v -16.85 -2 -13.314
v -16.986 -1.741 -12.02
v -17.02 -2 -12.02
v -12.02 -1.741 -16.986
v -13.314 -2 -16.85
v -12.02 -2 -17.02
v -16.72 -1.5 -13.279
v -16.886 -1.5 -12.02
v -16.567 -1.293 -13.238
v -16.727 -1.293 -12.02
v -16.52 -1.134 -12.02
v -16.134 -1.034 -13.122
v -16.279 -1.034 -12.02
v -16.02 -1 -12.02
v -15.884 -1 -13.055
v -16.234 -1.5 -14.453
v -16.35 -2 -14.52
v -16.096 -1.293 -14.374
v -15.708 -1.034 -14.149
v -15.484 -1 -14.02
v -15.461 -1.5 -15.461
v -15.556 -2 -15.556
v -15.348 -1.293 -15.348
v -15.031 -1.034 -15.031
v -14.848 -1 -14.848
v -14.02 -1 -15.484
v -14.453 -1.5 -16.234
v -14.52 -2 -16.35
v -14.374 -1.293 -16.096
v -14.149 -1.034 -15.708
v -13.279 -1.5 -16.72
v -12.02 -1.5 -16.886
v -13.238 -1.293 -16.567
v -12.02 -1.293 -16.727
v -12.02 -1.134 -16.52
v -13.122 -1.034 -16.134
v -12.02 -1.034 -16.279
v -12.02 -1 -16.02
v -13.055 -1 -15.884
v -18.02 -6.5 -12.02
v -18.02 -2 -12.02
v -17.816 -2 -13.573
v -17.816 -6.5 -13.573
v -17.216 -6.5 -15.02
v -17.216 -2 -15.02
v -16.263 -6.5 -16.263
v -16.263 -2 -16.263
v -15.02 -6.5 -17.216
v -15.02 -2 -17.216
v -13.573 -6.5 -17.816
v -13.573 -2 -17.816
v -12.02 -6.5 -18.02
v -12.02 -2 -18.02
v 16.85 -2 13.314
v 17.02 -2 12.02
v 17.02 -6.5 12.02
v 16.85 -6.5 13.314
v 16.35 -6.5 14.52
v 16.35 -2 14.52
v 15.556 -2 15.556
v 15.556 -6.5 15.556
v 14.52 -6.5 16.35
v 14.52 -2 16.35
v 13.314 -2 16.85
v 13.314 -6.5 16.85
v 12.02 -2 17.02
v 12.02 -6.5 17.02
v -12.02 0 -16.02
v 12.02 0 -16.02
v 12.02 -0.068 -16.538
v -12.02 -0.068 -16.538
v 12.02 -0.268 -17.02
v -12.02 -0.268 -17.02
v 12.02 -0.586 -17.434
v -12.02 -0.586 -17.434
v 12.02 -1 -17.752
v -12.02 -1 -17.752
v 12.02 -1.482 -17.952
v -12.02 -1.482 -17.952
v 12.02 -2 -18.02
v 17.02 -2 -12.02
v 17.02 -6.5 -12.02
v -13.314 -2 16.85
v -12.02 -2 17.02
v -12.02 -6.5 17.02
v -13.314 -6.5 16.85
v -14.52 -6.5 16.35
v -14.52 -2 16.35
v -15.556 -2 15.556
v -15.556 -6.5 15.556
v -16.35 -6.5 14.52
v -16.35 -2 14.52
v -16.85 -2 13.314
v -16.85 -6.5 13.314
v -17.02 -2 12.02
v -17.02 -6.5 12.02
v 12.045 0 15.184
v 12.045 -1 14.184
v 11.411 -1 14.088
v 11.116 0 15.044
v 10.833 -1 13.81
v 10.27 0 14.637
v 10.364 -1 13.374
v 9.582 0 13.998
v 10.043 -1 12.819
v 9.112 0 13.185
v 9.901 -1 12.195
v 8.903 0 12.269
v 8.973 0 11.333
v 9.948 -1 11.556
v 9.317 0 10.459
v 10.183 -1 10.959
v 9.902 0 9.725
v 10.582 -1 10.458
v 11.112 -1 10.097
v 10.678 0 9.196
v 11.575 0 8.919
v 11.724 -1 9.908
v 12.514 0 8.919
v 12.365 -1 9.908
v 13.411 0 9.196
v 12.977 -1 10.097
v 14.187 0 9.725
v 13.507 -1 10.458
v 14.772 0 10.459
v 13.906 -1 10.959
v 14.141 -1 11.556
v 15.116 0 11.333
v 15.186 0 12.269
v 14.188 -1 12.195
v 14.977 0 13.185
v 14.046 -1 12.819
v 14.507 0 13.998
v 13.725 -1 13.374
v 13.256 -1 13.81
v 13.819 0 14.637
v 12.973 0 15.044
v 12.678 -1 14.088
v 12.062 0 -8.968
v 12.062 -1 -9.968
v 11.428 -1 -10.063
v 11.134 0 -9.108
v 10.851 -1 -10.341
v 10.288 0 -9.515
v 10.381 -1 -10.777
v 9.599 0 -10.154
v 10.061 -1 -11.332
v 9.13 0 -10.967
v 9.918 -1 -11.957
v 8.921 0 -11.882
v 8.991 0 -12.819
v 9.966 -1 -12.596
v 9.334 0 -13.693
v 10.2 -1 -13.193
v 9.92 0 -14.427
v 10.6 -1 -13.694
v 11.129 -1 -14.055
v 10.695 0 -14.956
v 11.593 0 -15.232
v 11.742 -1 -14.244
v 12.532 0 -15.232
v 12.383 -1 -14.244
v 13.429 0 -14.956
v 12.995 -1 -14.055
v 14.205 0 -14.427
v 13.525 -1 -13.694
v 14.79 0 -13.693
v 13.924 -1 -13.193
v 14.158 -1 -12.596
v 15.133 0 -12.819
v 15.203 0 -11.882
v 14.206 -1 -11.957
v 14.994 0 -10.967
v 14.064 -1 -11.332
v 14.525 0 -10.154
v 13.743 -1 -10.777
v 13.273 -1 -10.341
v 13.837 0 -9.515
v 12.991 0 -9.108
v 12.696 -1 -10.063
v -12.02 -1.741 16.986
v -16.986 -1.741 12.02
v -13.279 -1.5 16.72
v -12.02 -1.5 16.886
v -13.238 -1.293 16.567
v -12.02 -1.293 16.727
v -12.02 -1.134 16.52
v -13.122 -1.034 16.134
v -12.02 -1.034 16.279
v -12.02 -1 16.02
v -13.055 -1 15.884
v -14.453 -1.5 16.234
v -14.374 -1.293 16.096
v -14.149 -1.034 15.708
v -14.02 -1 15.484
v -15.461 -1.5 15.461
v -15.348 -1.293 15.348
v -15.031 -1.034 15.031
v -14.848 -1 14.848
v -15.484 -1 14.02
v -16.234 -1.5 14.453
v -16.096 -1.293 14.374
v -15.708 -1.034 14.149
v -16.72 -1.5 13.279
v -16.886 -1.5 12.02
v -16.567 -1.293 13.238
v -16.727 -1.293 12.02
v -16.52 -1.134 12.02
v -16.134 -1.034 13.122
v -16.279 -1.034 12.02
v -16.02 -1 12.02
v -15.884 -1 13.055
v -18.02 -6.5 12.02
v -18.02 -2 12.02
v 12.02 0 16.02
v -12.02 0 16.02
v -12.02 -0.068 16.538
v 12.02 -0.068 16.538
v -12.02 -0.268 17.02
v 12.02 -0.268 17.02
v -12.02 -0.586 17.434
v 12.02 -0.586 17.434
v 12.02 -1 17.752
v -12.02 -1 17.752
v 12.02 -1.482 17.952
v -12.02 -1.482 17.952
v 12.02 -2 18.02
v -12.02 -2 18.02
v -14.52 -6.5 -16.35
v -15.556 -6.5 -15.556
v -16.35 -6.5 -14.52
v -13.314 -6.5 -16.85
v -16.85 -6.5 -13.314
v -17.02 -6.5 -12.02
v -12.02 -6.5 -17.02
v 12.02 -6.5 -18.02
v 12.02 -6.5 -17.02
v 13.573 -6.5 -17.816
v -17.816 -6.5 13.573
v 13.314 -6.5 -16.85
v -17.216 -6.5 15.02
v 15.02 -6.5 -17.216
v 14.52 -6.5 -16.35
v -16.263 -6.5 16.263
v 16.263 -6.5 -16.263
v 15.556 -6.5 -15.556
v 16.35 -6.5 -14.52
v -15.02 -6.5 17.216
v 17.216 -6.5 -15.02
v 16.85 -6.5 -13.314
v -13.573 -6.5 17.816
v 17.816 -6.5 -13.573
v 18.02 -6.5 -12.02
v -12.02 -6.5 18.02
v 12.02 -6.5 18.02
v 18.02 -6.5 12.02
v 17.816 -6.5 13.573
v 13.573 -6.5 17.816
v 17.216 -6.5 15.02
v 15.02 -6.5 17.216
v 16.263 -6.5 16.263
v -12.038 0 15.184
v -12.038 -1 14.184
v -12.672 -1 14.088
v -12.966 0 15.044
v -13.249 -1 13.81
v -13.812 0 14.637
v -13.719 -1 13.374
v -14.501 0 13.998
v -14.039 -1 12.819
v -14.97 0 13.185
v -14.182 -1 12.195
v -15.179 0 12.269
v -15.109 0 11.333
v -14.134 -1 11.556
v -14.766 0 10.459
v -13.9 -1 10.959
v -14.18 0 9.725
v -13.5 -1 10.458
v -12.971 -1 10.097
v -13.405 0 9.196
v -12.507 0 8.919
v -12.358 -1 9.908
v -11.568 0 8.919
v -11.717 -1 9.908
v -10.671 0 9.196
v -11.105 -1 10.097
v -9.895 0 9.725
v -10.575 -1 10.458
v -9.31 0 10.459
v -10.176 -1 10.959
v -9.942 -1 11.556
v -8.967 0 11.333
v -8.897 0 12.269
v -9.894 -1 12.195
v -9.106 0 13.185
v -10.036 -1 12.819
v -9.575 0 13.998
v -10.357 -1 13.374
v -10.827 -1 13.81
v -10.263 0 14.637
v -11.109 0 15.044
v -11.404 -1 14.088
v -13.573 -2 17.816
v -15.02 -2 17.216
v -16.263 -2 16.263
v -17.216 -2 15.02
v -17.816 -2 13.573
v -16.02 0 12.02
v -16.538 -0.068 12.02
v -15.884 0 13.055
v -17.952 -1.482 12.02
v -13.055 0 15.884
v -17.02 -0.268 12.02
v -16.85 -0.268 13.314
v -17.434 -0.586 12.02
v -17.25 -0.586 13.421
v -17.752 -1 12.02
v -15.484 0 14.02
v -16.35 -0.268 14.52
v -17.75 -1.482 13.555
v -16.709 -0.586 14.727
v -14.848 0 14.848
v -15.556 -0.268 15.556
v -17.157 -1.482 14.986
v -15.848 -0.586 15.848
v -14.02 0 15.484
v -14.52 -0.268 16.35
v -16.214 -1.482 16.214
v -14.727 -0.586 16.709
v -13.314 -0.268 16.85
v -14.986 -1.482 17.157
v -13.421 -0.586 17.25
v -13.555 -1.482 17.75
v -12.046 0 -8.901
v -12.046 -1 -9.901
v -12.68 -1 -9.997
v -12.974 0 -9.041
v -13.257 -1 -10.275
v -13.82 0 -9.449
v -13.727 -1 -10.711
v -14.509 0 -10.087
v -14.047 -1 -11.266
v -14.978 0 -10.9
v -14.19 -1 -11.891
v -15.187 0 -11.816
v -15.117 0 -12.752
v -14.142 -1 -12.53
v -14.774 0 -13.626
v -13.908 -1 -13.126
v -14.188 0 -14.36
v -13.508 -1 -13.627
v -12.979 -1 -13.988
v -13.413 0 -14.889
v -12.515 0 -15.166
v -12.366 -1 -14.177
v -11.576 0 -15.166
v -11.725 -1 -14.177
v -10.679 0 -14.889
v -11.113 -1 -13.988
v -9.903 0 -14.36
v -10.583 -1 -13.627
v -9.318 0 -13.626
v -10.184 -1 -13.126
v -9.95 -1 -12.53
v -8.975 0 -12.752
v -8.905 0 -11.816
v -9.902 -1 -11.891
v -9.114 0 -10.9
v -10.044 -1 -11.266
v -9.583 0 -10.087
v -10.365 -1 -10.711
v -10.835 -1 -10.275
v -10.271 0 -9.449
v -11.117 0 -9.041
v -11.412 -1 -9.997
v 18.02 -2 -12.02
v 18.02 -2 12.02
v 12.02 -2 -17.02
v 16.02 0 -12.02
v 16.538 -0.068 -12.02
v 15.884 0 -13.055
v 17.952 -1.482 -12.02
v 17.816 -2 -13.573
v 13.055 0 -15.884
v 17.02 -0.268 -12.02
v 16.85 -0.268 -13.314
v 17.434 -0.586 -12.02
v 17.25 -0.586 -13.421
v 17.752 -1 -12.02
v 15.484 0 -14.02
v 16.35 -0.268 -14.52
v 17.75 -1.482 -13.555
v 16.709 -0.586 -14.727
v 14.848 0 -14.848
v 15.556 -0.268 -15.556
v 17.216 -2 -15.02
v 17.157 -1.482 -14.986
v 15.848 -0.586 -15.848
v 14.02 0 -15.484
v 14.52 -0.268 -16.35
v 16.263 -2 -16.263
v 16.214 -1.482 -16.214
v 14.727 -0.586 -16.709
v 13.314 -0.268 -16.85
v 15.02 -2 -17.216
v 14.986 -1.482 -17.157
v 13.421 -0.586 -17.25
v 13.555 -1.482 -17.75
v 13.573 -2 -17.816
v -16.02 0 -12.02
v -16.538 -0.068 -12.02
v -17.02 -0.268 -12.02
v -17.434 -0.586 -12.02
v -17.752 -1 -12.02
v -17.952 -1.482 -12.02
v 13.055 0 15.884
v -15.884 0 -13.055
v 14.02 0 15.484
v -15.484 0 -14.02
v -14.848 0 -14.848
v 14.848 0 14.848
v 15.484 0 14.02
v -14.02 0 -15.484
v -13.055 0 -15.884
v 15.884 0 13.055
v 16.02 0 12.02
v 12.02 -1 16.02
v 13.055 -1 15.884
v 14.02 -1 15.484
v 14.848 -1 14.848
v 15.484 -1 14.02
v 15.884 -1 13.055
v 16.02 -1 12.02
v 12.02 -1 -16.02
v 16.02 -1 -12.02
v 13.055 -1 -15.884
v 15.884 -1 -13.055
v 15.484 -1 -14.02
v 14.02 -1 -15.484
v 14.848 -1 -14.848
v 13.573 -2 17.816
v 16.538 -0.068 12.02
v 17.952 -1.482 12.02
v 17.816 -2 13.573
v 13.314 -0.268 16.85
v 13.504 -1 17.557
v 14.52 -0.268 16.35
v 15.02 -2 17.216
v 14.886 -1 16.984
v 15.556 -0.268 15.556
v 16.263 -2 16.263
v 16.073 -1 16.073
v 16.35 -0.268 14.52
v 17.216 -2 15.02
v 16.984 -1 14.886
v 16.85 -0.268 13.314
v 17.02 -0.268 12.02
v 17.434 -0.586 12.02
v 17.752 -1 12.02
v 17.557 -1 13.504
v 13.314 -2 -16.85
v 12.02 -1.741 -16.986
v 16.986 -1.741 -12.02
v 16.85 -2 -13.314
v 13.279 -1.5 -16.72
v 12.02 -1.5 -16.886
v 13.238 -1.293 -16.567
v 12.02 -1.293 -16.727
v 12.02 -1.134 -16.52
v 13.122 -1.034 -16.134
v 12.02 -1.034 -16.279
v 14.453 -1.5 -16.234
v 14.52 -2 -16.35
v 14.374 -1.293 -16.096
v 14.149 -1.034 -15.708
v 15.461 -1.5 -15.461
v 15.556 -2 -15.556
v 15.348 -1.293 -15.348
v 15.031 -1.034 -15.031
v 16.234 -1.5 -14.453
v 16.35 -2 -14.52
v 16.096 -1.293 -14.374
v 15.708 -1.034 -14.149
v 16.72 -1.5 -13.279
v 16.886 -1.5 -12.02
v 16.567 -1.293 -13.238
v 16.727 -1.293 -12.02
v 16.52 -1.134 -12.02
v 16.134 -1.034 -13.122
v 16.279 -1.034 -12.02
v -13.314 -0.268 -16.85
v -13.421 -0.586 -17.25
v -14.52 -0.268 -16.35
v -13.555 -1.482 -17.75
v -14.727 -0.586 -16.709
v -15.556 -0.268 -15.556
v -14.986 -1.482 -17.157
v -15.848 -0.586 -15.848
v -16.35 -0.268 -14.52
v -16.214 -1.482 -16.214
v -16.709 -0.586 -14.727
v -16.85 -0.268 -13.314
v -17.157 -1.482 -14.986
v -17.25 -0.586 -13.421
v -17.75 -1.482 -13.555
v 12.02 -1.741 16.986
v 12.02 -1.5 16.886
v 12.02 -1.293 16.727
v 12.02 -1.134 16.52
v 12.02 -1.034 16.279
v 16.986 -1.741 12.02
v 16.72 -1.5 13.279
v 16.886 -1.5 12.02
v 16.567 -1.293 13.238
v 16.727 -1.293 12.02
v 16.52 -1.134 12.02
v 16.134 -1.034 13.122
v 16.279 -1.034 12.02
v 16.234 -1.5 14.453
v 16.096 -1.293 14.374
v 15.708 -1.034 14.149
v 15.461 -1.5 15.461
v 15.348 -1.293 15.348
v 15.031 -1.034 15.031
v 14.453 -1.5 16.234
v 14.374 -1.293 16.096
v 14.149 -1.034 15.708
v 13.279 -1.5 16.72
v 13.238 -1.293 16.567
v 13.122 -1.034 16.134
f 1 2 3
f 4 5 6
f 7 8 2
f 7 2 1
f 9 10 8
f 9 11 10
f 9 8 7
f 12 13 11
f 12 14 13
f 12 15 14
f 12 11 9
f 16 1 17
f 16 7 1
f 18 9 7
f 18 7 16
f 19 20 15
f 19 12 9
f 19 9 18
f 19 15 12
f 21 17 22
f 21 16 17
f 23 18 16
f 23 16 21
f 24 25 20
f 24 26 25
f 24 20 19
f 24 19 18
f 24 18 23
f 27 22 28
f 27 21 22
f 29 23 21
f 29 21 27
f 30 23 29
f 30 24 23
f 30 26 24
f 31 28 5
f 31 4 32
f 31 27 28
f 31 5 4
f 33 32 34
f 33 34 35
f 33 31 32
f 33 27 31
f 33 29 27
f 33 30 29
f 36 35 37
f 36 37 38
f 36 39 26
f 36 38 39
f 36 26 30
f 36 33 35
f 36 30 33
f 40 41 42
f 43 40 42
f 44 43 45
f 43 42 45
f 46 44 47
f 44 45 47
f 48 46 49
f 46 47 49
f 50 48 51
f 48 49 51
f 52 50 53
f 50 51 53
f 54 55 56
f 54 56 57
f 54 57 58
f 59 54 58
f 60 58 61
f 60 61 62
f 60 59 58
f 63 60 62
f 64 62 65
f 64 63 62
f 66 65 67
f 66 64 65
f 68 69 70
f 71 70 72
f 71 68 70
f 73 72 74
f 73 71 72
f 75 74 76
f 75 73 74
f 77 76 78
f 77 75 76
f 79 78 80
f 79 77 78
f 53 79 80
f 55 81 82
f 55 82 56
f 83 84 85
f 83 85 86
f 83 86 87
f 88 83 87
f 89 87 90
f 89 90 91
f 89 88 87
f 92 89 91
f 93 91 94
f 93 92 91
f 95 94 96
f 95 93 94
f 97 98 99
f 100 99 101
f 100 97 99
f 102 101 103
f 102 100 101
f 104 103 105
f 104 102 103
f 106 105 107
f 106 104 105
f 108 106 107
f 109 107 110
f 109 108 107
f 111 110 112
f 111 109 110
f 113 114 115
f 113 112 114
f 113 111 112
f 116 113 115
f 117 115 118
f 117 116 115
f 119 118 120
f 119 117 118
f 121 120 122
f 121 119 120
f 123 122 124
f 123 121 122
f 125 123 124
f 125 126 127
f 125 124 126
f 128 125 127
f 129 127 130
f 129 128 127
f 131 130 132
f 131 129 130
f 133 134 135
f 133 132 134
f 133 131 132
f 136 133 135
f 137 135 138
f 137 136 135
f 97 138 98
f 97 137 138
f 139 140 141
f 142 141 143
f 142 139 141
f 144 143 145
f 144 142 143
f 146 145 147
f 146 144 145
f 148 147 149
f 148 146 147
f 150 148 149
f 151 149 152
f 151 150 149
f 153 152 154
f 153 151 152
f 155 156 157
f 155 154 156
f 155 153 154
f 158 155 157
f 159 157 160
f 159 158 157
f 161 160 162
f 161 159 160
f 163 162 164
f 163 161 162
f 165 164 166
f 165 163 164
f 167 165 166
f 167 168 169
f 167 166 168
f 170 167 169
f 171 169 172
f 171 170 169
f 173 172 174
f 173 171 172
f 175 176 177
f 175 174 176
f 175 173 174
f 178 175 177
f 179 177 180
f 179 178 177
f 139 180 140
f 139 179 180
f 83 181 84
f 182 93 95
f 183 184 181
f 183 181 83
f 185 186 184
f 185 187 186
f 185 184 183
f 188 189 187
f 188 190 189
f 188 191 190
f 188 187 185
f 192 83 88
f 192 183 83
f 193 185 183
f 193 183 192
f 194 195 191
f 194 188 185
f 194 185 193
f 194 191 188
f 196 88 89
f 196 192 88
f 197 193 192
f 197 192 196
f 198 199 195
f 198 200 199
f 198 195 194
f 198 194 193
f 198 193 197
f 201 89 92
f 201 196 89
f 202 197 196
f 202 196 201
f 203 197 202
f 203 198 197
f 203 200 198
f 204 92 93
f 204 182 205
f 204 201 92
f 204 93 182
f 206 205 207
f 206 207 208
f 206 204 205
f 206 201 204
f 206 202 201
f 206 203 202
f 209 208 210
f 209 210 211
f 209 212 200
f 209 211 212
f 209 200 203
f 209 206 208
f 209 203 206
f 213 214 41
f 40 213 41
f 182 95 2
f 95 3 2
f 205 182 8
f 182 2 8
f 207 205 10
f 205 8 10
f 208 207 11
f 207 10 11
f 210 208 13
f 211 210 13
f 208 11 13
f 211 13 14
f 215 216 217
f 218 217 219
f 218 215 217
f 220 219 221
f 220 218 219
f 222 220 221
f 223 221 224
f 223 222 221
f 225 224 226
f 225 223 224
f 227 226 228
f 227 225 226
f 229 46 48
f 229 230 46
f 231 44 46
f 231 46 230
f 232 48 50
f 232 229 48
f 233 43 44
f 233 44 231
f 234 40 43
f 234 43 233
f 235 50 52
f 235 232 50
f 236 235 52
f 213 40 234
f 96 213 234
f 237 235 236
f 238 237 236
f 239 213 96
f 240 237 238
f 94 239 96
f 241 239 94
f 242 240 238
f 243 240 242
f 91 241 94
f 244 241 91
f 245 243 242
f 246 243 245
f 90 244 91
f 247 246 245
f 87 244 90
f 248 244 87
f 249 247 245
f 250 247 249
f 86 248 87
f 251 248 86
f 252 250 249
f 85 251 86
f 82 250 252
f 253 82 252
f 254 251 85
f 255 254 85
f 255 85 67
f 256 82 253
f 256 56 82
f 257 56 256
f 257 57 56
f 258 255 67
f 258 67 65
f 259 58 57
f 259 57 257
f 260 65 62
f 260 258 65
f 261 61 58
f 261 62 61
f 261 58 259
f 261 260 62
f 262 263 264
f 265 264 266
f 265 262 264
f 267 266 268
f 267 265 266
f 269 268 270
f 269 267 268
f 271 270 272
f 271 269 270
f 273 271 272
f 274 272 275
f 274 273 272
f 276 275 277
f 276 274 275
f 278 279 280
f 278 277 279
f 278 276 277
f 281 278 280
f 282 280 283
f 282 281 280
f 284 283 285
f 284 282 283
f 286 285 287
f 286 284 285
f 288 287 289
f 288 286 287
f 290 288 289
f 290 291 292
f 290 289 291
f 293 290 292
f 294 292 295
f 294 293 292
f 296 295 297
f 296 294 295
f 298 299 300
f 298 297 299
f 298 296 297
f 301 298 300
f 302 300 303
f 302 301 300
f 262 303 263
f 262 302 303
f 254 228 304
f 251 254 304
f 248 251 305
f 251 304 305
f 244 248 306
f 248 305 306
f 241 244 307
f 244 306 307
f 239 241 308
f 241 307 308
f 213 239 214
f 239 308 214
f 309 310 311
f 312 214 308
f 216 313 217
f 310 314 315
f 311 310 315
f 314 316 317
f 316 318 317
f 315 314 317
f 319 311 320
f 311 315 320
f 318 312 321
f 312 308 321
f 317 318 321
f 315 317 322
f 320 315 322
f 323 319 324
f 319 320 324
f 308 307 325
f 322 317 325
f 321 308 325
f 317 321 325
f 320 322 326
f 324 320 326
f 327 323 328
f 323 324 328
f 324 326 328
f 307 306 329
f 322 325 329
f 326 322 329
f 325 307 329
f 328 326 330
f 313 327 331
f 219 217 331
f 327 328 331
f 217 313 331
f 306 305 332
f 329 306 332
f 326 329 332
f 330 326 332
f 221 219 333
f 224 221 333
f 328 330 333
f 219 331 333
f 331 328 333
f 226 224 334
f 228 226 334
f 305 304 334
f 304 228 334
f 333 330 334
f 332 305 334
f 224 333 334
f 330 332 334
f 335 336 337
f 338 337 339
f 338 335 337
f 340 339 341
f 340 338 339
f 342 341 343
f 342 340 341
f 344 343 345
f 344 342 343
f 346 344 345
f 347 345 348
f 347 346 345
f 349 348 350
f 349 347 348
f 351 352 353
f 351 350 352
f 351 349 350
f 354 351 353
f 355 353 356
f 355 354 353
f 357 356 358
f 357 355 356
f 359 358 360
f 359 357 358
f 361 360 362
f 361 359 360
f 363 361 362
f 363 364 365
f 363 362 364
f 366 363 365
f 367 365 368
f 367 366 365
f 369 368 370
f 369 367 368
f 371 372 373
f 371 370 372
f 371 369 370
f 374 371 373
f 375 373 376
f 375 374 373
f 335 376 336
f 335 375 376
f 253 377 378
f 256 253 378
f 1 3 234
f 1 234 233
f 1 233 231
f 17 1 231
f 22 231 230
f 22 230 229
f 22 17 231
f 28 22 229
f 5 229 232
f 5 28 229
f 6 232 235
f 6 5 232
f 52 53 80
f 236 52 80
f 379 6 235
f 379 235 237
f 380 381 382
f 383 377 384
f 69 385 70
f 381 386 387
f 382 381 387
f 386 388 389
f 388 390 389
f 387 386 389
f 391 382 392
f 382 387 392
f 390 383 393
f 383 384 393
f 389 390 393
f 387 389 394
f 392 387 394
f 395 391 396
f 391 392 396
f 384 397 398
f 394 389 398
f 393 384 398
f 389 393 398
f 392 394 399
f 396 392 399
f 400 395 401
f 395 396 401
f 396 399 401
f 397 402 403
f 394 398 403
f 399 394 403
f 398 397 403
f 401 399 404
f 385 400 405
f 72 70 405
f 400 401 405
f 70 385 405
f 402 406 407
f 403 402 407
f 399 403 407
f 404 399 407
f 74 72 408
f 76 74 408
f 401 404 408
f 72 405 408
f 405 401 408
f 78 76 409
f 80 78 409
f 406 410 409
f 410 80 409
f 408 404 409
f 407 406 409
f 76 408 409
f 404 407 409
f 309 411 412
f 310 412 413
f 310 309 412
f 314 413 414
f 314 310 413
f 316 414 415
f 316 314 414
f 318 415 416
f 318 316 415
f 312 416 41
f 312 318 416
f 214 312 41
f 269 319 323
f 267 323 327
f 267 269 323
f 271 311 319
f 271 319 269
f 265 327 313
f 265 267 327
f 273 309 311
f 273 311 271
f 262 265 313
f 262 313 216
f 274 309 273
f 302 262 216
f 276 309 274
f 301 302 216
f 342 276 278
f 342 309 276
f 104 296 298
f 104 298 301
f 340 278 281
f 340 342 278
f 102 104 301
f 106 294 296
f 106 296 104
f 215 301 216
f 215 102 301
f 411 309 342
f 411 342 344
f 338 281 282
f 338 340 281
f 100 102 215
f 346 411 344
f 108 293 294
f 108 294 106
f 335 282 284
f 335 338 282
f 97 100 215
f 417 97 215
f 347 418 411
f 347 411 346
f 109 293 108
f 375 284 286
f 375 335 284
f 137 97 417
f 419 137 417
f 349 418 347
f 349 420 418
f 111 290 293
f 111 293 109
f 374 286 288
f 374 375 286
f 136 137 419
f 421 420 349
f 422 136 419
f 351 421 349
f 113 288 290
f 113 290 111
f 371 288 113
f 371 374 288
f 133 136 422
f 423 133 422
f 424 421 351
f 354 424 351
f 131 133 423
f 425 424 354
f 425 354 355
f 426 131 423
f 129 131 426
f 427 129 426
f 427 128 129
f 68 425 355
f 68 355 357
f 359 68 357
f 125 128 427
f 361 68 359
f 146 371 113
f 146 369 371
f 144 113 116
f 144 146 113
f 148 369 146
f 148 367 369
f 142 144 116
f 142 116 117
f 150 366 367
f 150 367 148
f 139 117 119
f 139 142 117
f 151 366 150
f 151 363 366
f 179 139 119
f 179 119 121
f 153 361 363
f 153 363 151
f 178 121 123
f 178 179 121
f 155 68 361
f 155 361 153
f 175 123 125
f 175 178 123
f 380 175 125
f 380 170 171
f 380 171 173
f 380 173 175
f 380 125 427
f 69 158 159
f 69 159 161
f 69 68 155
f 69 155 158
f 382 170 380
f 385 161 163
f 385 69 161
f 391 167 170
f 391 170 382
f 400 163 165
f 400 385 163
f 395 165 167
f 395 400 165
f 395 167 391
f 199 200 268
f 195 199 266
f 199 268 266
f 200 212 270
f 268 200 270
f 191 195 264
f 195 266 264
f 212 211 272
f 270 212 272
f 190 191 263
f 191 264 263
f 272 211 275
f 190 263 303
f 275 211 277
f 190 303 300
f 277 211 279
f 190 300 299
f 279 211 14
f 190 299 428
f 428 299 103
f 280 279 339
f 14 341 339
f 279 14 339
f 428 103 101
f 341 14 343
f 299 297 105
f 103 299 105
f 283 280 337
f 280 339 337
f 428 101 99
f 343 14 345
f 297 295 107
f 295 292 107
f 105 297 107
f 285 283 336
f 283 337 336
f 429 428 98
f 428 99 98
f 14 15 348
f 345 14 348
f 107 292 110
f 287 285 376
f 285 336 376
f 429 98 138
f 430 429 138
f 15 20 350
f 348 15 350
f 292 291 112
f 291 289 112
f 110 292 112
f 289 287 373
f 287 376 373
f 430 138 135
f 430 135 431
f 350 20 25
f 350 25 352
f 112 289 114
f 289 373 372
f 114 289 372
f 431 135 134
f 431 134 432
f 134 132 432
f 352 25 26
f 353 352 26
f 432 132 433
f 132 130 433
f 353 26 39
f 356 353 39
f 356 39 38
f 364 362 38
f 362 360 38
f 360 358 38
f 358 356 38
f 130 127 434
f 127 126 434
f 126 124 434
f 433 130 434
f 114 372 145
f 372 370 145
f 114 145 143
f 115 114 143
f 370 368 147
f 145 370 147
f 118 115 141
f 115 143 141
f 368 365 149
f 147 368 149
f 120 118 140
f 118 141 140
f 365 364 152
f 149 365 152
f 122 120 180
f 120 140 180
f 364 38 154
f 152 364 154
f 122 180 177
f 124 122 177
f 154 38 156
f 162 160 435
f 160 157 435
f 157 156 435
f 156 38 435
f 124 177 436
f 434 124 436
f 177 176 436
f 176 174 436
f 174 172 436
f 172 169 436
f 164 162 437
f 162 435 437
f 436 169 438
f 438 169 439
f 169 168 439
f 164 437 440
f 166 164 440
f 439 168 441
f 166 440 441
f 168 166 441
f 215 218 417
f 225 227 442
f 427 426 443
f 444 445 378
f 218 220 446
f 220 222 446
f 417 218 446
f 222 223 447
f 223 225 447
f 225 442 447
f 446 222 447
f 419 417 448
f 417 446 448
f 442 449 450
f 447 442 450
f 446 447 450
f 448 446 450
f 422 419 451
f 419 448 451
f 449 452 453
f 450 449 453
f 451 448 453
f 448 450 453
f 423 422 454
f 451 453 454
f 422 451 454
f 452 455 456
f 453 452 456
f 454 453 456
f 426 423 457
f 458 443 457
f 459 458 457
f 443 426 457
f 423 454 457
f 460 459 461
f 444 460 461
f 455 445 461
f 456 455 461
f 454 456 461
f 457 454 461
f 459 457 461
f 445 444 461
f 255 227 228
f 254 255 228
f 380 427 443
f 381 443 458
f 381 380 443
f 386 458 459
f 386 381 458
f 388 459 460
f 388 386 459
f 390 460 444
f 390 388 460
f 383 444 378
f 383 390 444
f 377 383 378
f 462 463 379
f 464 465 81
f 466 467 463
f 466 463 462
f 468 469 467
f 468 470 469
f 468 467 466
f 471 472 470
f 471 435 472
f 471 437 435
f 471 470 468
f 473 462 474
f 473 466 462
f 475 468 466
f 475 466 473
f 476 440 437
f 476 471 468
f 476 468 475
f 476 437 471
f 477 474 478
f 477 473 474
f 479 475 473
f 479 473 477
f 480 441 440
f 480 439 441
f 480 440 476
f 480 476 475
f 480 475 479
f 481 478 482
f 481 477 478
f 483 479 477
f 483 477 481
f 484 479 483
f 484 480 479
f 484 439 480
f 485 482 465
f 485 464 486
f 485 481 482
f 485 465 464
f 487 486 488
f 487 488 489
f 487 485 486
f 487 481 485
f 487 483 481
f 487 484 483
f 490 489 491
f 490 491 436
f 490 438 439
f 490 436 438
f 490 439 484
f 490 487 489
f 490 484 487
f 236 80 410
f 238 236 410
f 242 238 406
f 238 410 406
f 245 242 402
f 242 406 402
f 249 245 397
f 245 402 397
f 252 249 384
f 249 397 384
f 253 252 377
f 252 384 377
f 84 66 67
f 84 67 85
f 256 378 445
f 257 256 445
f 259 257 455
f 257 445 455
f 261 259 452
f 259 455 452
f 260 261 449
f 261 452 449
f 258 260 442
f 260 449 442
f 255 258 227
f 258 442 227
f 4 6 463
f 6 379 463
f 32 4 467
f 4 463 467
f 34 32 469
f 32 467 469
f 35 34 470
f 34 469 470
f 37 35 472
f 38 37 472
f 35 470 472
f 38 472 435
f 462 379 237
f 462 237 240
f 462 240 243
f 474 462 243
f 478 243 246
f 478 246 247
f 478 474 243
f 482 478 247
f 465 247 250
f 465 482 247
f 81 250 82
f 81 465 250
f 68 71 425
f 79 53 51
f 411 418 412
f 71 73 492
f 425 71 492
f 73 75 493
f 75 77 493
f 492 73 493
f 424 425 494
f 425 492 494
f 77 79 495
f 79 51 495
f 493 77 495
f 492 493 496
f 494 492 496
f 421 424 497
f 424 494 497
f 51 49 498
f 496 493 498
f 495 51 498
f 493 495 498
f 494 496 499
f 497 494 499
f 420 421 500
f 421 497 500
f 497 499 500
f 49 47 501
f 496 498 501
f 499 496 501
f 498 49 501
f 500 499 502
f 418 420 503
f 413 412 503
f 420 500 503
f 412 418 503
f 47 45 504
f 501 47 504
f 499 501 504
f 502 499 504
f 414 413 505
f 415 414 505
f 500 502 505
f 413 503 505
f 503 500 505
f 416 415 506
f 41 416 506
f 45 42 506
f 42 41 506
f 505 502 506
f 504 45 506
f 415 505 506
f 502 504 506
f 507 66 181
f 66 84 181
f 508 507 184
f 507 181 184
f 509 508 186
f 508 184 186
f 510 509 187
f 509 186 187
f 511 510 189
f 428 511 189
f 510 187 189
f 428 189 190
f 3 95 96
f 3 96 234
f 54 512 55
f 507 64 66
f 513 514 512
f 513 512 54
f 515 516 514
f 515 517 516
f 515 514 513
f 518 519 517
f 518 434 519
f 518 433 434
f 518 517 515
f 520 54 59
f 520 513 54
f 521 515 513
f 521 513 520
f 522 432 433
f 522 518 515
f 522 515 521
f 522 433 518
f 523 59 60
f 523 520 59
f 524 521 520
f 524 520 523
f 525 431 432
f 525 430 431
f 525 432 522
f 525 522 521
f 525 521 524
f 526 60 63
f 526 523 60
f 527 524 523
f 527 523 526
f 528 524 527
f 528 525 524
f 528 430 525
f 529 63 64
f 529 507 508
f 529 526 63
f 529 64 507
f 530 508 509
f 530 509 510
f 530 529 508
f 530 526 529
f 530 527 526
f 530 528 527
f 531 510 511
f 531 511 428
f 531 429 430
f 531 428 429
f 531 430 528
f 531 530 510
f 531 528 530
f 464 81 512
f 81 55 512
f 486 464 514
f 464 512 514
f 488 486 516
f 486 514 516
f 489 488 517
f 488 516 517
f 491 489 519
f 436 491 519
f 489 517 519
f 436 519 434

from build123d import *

# Parameters (mm, degrees)
BOSS_EXTRUDE1_DEPTH                          = 1
CSK_FOR_M3_COUNTERSUNK_FLAT_HEAD_SCR_2_COUNT = 2
CSK_FOR_M3_COUNTERSUNK_FLAT_HEAD_SCR_2_PITCH = 34.11906313
CSK_FOR_M3_COUNTERSUNK_FLAT_HEAD_SCR_3_COUNT = 2
CSK_FOR_M3_COUNTERSUNK_FLAT_HEAD_SCR_3_PITCH = 24.08237255
CSK_FOR_M3_COUNTERSUNK_FLAT_HEAD_SCR_4_COUNT = 2
CSK_FOR_M3_COUNTERSUNK_FLAT_HEAD_SCR_4_PITCH = 24.085156004
BOSS_EXTRUDE3_DEPTH                          = 5.5
FILLET1_R                                    = 2
FILLET2_R                                    = 1


with BuildPart() as part:
    # Sketch5 → Boss-Extrude1 (new body)
    with BuildSketch(Plane(origin=(0, 0, 0), x_dir=(1, 0, 0), z_dir=(0, 1, 0))):
        with BuildLine():
            Line((-18.02, 12.02), (-18.02, -12.02))
            ThreePointArc((-18.02, -12.02), (-16.262640687, -16.262640687), (-12.02, -18.02))
            Line((-12.02, -18.02), (12.02, -18.02))
            ThreePointArc((12.02, -18.02), (16.262640687, -16.262640687), (18.02, -12.02))
            Line((18.02, -12.02), (18.02, 12.02))
            ThreePointArc((18.02, 12.02), (16.262640687, 16.262640687), (12.02, 18.02))
            Line((12.02, 18.02), (-12.02, 18.02))
            ThreePointArc((-12.02, 18.02), (-16.262640687, 16.262640687), (-18.02, 12.02))
        make_face()
    extrude(amount=-BOSS_EXTRUDE1_DEPTH)

    # Sketch15 → CSK for M3 Countersunk Flat Head Screw3 (revolve, cut)
    with BuildSketch(Plane(origin=(-12.037863248, 0, 12.033949607), x_dir=(0, 0, 1), z_dir=(1, 0, 0))):
        Polygon((0, 0), (0, 1.001), (1.7, 1.001), (1.7, 1.45), (3.15, 0), align=None)
    csk_for_m3_countersunk_flat_head_screw3 = revolve(axis=Axis((-12.037863248, 6.35, 12.033949607), (0, -1, 0)), mode=Mode.SUBTRACT)

    # CSK for M3 Countersunk Flat Head Scr 2: CSK for M3 Countersunk Flat Head Screw3 ×2
    with Locations(*[Vector(0.706351229, 0, -0.707861527) * (i * CSK_FOR_M3_COUNTERSUNK_FLAT_HEAD_SCR_2_PITCH) for i in range(1, CSK_FOR_M3_COUNTERSUNK_FLAT_HEAD_SCR_2_COUNT)]):
        add(csk_for_m3_countersunk_flat_head_screw3, mode=Mode.SUBTRACT)

    # CSK for M3 Countersunk Flat Head Scr 3: CSK for M3 Countersunk Flat Head Screw3 ×2
    with Locations(*[(i * CSK_FOR_M3_COUNTERSUNK_FLAT_HEAD_SCR_3_PITCH, 0, 0) for i in range(1, CSK_FOR_M3_COUNTERSUNK_FLAT_HEAD_SCR_3_COUNT)]):
        add(csk_for_m3_countersunk_flat_head_screw3, mode=Mode.SUBTRACT)

    # CSK for M3 Countersunk Flat Head Scr 4: CSK for M3 Countersunk Flat Head Screw3 ×2
    with Locations(*[Vector(-0.000330161, 0, -0.999999945) * (i * CSK_FOR_M3_COUNTERSUNK_FLAT_HEAD_SCR_4_PITCH) for i in range(1, CSK_FOR_M3_COUNTERSUNK_FLAT_HEAD_SCR_4_COUNT)]):
        add(csk_for_m3_countersunk_flat_head_screw3, mode=Mode.SUBTRACT)

    # Sketch16 → Boss-Extrude3 (add)
    with BuildSketch(Plane.XZ.offset(1)):
        with BuildLine():
            Line((18.02, -12.02), (18.02, 12.02))
            ThreePointArc((18.02, 12.02), (16.262640687, 16.262640687), (12.02, 18.02))
            Line((12.02, 18.02), (-12.02, 18.02))
            ThreePointArc((-12.02, 18.02), (-16.262640687, 16.262640687), (-18.02, 12.02))
            Line((-18.02, 12.02), (-18.02, -12.02))
            ThreePointArc((-18.02, -12.02), (-16.262640687, -16.262640687), (-12.02, -18.02))
            Line((-12.02, -18.02), (12.02, -18.02))
            ThreePointArc((12.02, -18.02), (16.262640687, -16.262640687), (18.02, -12.02))
        make_face()
        with BuildLine():
            Line((17.02, -12.02), (17.02, 12.02))
            ThreePointArc((17.02, 12.02), (15.555533906, 15.555533906), (12.02, 17.02))
            Line((12.02, 17.02), (-12.02, 17.02))
            ThreePointArc((-12.02, 17.02), (-15.555533906, 15.555533906), (-17.02, 12.02))
            Line((-17.02, 12.02), (-17.02, -12.02))
            ThreePointArc((-17.02, -12.02), (-15.555533906, -15.555533906), (-12.02, -17.02))
            Line((-12.02, -17.02), (12.02, -17.02))
            ThreePointArc((12.02, -17.02), (15.555533906, -15.555533906), (17.02, -12.02))
        make_face(mode=Mode.SUBTRACT)
    extrude(amount=BOSS_EXTRUDE3_DEPTH)

    # Fillet1
    fillet1_edges = [part.edges().sort_by_distance(p)[0] for p in [
        (16.262640687, 0, 16.262640687),
        (0, 0, 18.02),
        (-16.262640687, 0, 16.262640687),
        (-18.02, 0, 0),
        (-16.262640687, 0, -16.262640687),
        (0, 0, -18.02),
        (16.262640687, 0, -16.262640687),
        (18.02, 0, 0),
    ]]
    fillet(fillet1_edges, radius=FILLET1_R)

    # Fillet2
    fillet2_edges = [part.edges().sort_by_distance(p)[0] for p in [
        (15.555533906, -1, -15.555533906),
        (17.02, -1, 0),
        (15.555533906, -1, 15.555533906),
        (0, -1, 17.02),
        (-15.555533906, -1, 15.555533906),
        (-17.02, -1, 0),
        (-15.555533906, -1, -15.555533906),
        (0, -1, -17.02),
    ]]
    fillet(fillet2_edges, radius=FILLET2_R)


solid = part.part
